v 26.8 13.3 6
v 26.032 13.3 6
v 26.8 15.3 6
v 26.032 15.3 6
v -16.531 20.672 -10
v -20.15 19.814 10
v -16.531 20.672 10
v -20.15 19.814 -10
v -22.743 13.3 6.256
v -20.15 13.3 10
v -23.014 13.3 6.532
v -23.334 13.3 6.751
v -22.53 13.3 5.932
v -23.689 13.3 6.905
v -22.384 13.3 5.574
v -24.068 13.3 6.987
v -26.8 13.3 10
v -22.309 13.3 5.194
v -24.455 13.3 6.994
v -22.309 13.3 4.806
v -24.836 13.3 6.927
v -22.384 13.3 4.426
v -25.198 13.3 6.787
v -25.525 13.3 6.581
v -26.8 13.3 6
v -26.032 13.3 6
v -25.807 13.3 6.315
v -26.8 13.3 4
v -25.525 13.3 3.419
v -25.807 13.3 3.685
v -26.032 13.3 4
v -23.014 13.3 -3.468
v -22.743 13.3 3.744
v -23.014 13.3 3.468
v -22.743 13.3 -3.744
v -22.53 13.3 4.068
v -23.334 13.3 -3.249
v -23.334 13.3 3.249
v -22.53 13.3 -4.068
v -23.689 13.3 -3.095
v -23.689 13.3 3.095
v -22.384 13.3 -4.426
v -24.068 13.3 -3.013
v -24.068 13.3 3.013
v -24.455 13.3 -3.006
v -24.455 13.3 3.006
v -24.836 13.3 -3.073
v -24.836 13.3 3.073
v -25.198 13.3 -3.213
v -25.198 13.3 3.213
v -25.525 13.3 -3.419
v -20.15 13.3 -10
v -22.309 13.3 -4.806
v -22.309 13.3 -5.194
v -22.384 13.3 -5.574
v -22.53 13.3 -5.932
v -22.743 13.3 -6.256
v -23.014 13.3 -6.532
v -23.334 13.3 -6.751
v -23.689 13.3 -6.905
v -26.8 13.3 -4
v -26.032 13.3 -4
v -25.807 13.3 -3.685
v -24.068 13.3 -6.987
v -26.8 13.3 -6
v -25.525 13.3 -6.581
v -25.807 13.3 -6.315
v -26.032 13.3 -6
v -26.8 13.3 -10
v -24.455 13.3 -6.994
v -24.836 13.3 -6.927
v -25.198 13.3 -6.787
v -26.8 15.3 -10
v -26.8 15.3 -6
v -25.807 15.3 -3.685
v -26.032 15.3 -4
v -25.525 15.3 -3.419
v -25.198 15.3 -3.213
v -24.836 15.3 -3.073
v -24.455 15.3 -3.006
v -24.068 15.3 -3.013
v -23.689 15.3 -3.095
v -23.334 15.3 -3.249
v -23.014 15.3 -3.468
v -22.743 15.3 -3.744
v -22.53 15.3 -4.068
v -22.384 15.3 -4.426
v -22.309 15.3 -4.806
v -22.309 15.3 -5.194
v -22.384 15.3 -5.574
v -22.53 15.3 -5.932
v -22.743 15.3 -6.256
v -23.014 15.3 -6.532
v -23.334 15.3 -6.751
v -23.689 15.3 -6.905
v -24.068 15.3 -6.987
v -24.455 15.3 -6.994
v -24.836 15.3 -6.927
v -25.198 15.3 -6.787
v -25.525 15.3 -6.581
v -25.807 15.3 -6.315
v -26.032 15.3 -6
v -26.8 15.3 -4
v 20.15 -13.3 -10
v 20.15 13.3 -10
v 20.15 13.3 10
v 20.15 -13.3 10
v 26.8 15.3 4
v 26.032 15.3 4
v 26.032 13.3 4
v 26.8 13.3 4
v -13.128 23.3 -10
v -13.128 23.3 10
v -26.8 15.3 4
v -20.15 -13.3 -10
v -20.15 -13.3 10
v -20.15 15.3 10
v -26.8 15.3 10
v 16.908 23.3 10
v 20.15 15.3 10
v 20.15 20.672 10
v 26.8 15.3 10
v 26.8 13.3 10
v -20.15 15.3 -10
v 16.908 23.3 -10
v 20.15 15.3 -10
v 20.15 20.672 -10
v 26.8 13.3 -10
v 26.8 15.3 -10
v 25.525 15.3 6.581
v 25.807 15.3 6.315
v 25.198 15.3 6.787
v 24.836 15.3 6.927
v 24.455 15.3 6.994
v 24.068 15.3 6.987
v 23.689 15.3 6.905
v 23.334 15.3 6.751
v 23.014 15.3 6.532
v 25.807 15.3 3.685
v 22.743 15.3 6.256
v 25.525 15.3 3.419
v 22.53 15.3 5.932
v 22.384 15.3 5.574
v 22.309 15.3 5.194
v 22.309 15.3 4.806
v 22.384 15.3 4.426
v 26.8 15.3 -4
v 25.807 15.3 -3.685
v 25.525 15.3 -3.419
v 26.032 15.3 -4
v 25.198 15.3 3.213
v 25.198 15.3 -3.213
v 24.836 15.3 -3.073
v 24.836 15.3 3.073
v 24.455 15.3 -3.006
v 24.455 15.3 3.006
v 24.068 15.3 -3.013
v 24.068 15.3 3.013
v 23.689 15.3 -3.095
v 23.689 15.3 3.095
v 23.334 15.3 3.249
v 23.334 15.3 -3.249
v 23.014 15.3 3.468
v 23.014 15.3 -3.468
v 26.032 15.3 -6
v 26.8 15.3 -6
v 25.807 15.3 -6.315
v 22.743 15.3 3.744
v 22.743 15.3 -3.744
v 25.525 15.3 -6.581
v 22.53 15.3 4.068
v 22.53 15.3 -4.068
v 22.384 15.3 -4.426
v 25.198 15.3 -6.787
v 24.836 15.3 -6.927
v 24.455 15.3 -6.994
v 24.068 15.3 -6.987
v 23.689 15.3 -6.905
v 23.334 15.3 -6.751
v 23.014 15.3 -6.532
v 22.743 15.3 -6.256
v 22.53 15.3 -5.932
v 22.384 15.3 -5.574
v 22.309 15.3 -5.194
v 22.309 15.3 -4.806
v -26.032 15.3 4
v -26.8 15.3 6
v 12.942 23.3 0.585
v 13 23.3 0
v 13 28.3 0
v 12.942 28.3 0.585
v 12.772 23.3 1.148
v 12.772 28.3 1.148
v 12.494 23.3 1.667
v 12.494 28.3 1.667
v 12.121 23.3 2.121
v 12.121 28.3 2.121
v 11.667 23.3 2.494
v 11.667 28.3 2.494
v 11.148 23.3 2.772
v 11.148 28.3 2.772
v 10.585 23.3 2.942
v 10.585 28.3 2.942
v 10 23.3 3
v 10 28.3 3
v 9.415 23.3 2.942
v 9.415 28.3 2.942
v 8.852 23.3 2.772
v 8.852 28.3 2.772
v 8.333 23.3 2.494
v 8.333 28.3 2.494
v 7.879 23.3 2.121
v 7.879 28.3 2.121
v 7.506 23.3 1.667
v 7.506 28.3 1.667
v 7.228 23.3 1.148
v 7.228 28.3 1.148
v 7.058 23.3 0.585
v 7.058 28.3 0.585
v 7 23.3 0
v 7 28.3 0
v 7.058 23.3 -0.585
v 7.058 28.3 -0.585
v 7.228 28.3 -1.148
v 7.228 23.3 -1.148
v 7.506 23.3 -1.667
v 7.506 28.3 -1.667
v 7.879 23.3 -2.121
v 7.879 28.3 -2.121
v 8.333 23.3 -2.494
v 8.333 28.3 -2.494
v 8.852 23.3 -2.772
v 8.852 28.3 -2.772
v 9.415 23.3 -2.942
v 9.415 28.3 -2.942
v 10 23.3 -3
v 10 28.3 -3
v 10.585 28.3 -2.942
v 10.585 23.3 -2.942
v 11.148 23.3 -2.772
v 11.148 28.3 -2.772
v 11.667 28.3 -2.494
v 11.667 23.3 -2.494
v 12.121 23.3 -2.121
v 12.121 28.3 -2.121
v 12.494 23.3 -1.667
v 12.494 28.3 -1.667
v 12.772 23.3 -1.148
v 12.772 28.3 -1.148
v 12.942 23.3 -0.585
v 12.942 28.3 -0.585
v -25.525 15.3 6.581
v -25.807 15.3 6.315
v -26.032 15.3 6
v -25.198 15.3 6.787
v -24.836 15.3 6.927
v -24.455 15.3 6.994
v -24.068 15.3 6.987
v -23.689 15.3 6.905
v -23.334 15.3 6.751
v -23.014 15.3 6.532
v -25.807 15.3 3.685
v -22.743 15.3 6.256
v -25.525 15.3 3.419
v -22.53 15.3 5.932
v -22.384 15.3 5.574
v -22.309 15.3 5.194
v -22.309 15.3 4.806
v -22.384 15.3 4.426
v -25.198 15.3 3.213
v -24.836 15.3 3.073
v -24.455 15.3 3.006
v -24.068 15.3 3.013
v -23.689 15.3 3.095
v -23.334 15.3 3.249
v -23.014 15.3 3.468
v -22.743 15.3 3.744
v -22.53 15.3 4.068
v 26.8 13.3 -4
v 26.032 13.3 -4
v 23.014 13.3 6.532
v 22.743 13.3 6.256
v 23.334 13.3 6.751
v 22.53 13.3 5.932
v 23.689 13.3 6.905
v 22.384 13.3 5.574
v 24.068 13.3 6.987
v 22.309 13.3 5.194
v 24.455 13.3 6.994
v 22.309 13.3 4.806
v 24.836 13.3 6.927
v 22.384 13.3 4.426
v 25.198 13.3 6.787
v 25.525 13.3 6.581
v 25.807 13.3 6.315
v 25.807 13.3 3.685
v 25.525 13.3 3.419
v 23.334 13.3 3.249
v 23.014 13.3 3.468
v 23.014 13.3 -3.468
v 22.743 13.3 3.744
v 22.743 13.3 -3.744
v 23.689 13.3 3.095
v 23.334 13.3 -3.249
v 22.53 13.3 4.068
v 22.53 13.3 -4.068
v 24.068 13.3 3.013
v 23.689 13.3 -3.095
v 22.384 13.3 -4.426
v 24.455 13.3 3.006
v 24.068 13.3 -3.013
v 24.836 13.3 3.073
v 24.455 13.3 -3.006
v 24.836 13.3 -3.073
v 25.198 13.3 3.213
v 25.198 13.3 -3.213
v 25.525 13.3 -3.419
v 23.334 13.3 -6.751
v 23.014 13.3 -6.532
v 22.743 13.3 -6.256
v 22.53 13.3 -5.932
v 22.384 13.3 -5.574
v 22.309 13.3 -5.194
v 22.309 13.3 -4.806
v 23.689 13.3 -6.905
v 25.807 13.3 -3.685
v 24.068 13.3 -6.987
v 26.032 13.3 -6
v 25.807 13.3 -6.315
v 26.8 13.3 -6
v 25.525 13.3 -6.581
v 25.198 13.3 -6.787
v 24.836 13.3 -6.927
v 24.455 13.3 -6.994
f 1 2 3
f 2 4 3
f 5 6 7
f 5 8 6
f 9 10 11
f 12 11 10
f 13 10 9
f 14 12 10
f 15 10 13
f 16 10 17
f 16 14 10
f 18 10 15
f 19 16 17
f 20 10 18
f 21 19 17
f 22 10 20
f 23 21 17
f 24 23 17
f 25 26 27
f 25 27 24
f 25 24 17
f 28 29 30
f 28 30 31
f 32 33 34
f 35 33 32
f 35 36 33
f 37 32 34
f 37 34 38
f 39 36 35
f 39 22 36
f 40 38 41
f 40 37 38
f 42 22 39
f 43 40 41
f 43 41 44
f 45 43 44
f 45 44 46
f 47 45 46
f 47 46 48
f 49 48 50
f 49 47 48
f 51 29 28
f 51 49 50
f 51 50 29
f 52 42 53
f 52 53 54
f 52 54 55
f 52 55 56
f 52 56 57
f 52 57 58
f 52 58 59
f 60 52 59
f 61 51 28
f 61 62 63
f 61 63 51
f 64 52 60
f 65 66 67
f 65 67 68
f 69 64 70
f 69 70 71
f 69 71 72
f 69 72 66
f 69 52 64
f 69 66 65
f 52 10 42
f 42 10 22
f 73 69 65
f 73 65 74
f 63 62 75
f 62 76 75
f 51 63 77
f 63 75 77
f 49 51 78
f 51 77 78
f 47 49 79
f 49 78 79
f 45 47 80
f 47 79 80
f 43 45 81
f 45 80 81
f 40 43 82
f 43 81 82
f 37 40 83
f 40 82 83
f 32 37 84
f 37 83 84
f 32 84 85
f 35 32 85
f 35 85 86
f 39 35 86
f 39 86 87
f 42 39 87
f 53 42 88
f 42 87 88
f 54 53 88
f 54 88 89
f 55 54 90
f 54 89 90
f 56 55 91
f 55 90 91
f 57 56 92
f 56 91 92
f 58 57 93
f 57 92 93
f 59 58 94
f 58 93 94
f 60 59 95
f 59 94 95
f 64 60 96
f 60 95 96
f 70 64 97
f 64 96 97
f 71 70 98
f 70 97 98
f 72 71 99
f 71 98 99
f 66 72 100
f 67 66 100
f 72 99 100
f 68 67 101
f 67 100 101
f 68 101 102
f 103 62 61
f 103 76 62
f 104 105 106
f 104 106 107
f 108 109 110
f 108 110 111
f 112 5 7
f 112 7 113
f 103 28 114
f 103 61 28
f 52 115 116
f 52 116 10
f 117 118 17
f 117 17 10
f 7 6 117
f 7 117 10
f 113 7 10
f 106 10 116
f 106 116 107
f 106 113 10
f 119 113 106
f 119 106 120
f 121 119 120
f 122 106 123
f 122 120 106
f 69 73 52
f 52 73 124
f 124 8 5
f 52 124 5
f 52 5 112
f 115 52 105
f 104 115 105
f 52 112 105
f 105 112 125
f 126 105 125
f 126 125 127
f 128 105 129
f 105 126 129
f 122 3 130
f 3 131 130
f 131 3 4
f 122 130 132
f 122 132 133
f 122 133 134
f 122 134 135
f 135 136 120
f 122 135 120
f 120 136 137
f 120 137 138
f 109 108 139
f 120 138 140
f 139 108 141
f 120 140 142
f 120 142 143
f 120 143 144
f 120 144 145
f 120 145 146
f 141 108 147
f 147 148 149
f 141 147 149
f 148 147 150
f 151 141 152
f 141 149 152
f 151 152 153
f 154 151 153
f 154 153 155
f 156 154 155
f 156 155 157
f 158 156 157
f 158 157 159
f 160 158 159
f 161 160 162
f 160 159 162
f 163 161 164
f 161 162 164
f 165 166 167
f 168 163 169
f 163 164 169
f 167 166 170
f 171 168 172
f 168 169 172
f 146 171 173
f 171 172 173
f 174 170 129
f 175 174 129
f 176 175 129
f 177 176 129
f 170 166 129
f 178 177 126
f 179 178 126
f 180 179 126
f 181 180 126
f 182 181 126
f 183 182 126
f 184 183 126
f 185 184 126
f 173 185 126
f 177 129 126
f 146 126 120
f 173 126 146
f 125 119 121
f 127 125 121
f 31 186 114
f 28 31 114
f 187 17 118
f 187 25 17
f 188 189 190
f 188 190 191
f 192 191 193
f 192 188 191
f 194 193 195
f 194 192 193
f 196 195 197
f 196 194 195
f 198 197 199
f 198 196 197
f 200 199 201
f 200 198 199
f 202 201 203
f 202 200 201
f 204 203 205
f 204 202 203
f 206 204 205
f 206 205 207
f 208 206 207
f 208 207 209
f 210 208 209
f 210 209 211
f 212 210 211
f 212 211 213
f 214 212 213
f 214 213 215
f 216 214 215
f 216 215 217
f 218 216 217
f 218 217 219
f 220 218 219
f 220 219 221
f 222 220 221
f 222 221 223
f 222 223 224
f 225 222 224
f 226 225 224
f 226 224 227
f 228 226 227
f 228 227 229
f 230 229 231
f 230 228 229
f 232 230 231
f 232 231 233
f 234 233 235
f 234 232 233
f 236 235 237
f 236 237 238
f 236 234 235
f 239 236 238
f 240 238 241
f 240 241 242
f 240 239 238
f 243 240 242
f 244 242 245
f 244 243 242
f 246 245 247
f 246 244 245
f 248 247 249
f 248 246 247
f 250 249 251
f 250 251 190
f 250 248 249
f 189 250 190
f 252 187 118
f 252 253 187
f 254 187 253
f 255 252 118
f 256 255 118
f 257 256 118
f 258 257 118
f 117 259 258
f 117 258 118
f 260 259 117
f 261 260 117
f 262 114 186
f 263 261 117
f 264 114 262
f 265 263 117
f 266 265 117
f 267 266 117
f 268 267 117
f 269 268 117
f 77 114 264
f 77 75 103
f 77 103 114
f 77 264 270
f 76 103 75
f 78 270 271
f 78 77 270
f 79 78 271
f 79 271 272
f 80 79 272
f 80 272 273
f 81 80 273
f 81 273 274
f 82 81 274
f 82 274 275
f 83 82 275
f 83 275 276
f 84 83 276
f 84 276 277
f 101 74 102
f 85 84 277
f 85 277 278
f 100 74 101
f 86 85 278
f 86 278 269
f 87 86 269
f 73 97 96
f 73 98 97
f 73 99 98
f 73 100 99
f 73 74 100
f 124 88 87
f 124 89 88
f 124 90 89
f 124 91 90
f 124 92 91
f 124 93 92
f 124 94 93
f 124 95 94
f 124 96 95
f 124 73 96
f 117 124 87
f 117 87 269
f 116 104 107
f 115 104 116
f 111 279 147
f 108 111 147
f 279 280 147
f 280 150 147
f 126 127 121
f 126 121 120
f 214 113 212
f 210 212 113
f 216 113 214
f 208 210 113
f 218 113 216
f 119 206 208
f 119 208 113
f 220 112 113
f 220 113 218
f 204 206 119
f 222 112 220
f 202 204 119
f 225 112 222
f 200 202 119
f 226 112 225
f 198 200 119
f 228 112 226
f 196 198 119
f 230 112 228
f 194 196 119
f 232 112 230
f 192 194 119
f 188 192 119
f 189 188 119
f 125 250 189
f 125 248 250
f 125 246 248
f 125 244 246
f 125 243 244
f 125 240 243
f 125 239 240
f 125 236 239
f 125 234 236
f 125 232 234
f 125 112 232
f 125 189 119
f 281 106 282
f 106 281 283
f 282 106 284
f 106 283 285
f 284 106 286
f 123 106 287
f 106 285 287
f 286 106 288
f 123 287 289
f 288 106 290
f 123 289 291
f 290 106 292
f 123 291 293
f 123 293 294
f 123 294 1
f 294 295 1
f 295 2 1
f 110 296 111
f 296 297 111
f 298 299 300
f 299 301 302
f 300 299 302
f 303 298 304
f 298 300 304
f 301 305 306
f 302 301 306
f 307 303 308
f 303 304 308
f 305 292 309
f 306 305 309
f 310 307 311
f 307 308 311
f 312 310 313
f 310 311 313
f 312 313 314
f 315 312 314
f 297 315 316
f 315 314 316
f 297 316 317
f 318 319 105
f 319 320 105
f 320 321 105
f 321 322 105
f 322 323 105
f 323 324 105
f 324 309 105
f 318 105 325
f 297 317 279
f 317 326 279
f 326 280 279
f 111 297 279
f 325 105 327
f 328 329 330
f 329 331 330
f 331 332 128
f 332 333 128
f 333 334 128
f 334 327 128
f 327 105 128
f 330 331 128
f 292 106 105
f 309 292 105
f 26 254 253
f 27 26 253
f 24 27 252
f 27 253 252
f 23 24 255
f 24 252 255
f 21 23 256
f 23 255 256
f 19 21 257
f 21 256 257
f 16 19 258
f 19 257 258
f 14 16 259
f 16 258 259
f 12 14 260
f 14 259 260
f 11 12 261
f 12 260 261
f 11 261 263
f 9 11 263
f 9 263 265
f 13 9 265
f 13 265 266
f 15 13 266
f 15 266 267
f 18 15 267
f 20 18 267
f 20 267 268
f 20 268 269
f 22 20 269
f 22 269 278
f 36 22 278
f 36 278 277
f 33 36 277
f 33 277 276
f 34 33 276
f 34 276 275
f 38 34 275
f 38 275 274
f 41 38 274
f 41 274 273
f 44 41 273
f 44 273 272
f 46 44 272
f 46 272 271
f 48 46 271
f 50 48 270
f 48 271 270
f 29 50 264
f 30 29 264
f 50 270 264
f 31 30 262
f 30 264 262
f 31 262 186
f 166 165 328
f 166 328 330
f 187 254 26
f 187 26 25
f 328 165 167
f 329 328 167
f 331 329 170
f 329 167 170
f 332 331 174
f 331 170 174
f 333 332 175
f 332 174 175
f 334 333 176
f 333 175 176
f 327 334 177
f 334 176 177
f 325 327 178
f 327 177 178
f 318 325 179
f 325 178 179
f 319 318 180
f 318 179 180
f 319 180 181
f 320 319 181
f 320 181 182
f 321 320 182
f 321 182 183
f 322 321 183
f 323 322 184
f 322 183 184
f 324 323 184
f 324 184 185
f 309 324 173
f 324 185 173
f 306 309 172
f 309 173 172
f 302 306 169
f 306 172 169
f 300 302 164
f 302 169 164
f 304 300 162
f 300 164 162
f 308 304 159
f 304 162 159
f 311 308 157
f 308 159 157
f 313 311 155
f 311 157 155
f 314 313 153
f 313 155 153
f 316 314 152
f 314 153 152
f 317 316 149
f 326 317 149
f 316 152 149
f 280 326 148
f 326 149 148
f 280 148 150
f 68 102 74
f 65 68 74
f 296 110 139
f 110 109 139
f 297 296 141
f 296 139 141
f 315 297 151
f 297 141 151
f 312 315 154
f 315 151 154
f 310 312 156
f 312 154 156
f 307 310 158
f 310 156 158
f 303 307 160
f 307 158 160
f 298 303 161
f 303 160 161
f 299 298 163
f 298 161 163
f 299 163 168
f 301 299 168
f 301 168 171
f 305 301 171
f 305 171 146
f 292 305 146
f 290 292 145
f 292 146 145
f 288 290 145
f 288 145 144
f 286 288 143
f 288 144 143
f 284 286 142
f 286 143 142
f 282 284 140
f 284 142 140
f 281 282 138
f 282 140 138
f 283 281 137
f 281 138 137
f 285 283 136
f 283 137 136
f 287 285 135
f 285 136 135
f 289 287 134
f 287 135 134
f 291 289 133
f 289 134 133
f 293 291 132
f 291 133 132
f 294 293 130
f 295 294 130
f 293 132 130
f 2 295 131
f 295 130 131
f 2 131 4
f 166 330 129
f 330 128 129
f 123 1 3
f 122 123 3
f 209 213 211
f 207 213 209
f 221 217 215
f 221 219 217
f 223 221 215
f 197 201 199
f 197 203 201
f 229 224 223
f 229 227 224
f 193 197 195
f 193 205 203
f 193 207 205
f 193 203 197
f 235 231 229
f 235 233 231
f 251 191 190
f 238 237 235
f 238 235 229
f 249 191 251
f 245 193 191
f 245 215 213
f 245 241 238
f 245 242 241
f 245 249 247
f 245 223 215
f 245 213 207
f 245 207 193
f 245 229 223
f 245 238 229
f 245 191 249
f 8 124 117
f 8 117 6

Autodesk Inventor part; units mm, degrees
ref_plane "YZ Plane" through (0, 0, 0) normal (1, 0, 0) x (0, 1, 0)
ref_plane "XZ Plane" through (0, 0, 0) normal (0, 1, 0) x (-1, 0, 0)
ref_plane "XY Plane" through (0, 0, 0) normal (0, 0, 1) x (1, 0, 0)
sketch "Skizze1" plane through (0, 0, 0) normal (0, 0, 1) x (1, 0, 0)
  line L0 (-20.15, 13.3) -> (20.15, 13.3)
  line L1 (20.15, 13.3) -> (20.15, -13.3)
  line L2 (20.15, -13.3) -> (-20.15, -13.3)
  line L3 (-20.15, -13.3) -> (-20.15, 13.3)
  line L4 (0, 30.62) -> (0, -20.62) projected
  line L5 (-37.52, 0) -> (37.52, 0) projected
  line L6 (-20.15, 13.3) -> (-20.15, 19.8141)
  line L7 (-13.1284, 23.3) -> (16.9083, 23.3)
  line L8 (20.15, 20.6722) -> (20.15, 13.3)
  line L9 (16.9083, 23.3) -> (20.15, 20.6722)
  line L10 (-20.15, 19.8141) -> (-16.5313, 20.6722)
  line L11 (-16.5313, 20.6722) -> (-13.1284, 23.3)
  line L12 (20.15, 13.3) -> (26.8, 13.3)
  line L13 (26.8, 13.3) -> (26.8, 15.3)
  line L14 (26.8, 15.3) -> (20.15, 15.3)
  line L15 (20.15, 15.3) -> (20.15, 13.3)
  line L16 (-20.15, 13.3) -> (-26.8, 13.3)
  line L17 (-26.8, 13.3) -> (-26.8, 15.3)
  line L18 (-26.8, 15.3) -> (-20.15, 15.3)
  line L19 (-20.15, 15.3) -> (-20.15, 13.3)
  line L20 (6, 23.3) -> (11, 23.3)
  point P0 (0, 0)
  dimension "d0" = 40.3
  dimension "d1" = 26.6
  dimension "d3" = 10
  dimension "d4" = 3.6187
  dimension "d5" = 3.4029
  dimension "d6" = 3.2417
  dimension "d7" = 103.34
  dimension "d8" = 142.325
  dimension "d9" = 140.972
  dimension "d10" = 6.65
  dimension "d11" = 2
  dimension "d12" = 6.65
  dimension "d13" = 2
extrude "Extrusion1" add sketch "Skizze1" along normal mid plane 20
sketch "Skizze2" plane through (-26.8, 15.3, 10) normal (0, 1, 0) x (1, 0, 0)
  line L0 (64.32, 10) -> (-10.72, 10) projected
  line L1 (26.8, 24) -> (26.8, -4) projected
  arc A0 (0.7679, 14) -> (0.7679, 16) centre (2.5, 15) ccw
  line L2 (0, 20) -> (0, 0) projected
  line L3 (0.7679, 16) -> (0, 16)
  line L4 (0, 20) -> (0, 0) projected
  line L5 (0.7679, 14) -> (0, 14)
  line L6 (0, 16) -> (0, 14)
  line L7 (2.5, 15) -> (0.8619, 15)
  arc A1 (0.7679, 4) -> (0.7679, 6) centre (2.5, 5) ccw
  line L8 (0.7679, 4) -> (0, 4)
  line L9 (0.7679, 6) -> (0, 6)
  line L10 (0, 4) -> (0, 6)
  line L11 (2.5, 5) -> (0.8619, 5)
  arc A2 (52.8321, 16) -> (52.8321, 14) centre (51.1, 15) ccw
  line L12 (52.8321, 16) -> (53.6, 16)
  line L13 (52.8321, 14) -> (53.6, 14)
  line L14 (53.6, 16) -> (53.6, 14)
  line L15 (51.1, 15) -> (52.7381, 15)
  arc A3 (52.8321, 6) -> (52.8321, 4) centre (51.1, 5) ccw
  line L16 (52.8321, 4) -> (53.6, 4)
  line L17 (52.8321, 6) -> (53.6, 6)
  line L18 (53.6, 4) -> (53.6, 6)
  line L19 (51.1, 5) -> (52.7381, 5)
  point P0 (26.8, 10)
  dimension "d19" = 4
  dimension "d21" = 5
  dimension "d23" = 2.5
  dimension "d25" = 2
extrude "Extrusion2" cut sketch "Skizze2" against normal up to surface (2 mm away)
sketch "Skizze3" plane through (-13.1284, 23.3, 10) normal (0, 1, 0) x (1, 0, 0)
  line L0 (13.1284, 24) -> (13.1284, -4) projected
  line L1 (-24.3916, 10) -> (50.6484, 10) projected
  circle A0 centre (23.1284, 10) radius 3
  point P0 (13.1284, 10)
  dimension "d28" = 6
  dimension "d29" = 10
extrude "Extrusion3" add sketch "Skizze3" along normal blind 5
properties part number "Servo"
